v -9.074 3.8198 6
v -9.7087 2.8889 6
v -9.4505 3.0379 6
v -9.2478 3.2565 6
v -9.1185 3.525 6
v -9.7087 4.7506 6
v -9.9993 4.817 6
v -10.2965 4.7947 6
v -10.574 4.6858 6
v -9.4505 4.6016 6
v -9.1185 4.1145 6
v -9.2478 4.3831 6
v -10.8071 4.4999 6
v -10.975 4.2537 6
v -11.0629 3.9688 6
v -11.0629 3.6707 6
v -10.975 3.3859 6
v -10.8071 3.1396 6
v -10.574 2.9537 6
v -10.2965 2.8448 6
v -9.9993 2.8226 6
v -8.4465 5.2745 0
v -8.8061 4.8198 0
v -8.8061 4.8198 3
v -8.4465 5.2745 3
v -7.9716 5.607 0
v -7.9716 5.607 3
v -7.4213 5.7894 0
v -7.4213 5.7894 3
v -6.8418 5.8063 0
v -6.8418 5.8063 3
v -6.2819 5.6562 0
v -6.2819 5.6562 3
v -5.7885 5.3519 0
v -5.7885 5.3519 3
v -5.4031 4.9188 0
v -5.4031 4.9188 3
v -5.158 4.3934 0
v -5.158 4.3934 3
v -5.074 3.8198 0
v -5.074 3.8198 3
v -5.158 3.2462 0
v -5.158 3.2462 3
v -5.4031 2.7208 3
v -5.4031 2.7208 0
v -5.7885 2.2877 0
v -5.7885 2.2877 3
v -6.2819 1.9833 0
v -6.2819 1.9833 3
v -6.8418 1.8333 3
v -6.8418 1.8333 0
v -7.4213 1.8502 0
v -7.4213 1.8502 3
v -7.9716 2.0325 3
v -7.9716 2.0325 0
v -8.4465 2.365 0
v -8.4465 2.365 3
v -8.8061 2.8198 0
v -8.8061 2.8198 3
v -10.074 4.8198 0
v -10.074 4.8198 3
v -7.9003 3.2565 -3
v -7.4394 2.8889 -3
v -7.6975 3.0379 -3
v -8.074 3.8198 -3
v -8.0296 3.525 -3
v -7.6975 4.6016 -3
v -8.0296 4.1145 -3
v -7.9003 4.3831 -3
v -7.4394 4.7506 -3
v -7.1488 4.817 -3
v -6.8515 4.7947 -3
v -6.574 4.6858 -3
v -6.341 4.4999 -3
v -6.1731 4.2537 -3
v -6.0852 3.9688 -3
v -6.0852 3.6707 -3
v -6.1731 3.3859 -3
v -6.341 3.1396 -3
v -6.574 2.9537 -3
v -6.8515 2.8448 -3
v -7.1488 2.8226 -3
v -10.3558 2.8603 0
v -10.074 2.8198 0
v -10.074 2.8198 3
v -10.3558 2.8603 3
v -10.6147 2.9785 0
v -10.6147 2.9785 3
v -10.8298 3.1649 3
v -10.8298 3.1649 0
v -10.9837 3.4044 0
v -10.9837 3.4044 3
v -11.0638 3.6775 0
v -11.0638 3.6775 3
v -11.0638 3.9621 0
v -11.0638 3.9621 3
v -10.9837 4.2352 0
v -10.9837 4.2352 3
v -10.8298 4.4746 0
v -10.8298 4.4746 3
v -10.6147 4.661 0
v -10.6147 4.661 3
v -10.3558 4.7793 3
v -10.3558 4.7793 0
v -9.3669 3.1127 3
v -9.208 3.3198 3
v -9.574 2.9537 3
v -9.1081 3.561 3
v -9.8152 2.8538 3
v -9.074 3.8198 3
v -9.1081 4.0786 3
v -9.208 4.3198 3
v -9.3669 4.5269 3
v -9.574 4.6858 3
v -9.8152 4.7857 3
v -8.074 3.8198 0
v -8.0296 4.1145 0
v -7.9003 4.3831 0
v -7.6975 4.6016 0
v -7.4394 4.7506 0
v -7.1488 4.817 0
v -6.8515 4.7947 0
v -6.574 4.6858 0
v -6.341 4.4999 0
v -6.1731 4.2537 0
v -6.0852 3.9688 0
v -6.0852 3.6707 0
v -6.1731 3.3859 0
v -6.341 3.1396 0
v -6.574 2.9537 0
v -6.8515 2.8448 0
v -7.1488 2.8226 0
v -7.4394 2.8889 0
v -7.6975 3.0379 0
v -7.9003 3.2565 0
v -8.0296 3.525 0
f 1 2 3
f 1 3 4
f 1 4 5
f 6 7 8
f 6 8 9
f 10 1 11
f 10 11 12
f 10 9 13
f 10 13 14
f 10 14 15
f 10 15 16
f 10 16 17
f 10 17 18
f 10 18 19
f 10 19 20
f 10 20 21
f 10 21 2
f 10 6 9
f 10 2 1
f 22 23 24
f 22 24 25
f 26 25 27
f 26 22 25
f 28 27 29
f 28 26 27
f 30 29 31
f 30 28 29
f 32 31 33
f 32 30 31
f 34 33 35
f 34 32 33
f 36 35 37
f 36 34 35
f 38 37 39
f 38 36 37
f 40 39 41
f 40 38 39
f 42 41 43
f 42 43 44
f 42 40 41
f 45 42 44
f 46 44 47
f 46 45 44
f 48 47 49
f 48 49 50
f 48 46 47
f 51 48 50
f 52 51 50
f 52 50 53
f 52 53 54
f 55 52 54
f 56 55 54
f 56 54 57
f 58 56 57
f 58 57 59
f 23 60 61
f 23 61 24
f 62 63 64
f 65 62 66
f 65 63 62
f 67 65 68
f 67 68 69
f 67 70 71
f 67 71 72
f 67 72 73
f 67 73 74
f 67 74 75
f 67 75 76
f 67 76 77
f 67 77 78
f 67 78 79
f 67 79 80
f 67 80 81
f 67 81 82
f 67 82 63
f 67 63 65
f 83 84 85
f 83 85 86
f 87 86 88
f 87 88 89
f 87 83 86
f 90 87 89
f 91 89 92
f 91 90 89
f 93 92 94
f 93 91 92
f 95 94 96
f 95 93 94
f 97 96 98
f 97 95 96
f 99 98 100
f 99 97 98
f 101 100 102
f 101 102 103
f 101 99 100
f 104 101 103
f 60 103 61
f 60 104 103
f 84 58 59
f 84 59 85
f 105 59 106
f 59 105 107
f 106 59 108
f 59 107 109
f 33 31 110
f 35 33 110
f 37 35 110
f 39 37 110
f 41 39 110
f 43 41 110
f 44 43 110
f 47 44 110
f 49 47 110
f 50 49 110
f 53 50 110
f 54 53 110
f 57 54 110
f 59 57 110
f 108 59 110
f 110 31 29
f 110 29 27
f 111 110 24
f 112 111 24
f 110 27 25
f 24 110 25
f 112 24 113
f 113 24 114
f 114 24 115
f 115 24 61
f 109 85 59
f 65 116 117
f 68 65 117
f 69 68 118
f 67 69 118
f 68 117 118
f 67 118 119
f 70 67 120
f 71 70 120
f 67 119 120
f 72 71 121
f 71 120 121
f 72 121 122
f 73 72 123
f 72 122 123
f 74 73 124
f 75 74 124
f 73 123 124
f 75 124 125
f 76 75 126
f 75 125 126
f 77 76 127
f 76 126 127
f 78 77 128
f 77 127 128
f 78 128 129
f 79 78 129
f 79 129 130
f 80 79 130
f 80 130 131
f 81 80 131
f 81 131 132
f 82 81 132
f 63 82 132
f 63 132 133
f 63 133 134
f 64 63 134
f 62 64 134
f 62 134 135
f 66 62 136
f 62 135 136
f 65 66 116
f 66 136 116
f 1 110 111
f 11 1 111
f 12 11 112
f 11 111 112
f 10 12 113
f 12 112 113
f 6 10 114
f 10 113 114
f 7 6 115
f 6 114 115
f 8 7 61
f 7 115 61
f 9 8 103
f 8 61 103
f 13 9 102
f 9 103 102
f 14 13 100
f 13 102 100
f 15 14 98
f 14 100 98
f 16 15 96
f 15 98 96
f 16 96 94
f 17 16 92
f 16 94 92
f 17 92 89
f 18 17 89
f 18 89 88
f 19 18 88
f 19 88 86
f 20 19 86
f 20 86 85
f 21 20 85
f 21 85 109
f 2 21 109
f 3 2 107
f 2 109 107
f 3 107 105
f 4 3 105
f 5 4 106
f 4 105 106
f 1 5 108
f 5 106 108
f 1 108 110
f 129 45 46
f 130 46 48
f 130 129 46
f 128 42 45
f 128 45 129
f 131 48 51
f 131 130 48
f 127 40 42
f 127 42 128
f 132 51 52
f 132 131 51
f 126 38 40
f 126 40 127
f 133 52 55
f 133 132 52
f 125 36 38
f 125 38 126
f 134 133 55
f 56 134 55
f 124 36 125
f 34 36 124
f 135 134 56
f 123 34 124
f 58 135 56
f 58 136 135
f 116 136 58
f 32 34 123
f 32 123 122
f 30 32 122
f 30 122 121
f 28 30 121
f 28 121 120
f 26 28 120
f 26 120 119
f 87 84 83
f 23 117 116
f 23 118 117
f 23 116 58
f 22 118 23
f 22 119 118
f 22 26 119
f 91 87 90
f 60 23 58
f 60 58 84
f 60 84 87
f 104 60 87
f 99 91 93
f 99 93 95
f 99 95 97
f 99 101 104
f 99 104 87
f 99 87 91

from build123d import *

# Parameters (mm, degrees)
BOSS_EXTRUDE1_DEPTH = 3
SKETCH2_R           = 1
BOSS_EXTRUDE2_DEPTH = 3
SKETCH3_R           = 1
BOSS_EXTRUDE3_DEPTH = 3


with BuildPart() as part:
    # Sketch1 → Boss-Extrude1 (new body)
    with BuildSketch(Plane.XY):
        with BuildLine():
            Line((-10.074027202, 4.819774295), (-8.80607801, 4.819774295))
            ThreePointArc((-8.80607801, 4.819774295), (-5.074027202, 3.819774295), (-8.80607801, 2.819774295))
            Line((-8.80607801, 2.819774295), (-10.074027202, 2.819774295))
            ThreePointArc((-10.074027202, 2.819774295), (-11.074027202, 3.819774295), (-10.074027202, 4.819774295))
        make_face()
    extrude(amount=BOSS_EXTRUDE1_DEPTH)

    # Sketch2 → Boss-Extrude2 (add)
    with BuildSketch(Plane.XY.offset(3)):
        with Locations((-10.074027202, 3.819774295)):
            Circle(SKETCH2_R)
    extrude(amount=BOSS_EXTRUDE2_DEPTH)

    # Sketch3 → Boss-Extrude3 (add)
    with BuildSketch(Plane(origin=(0, 0, 0), x_dir=(-1, 0, 0), z_dir=(0, 0, -1))):
        with Locations((7.074027202, 3.819774295)):
            Circle(SKETCH3_R)
    extrude(amount=BOSS_EXTRUDE3_DEPTH)


solid = part.part
